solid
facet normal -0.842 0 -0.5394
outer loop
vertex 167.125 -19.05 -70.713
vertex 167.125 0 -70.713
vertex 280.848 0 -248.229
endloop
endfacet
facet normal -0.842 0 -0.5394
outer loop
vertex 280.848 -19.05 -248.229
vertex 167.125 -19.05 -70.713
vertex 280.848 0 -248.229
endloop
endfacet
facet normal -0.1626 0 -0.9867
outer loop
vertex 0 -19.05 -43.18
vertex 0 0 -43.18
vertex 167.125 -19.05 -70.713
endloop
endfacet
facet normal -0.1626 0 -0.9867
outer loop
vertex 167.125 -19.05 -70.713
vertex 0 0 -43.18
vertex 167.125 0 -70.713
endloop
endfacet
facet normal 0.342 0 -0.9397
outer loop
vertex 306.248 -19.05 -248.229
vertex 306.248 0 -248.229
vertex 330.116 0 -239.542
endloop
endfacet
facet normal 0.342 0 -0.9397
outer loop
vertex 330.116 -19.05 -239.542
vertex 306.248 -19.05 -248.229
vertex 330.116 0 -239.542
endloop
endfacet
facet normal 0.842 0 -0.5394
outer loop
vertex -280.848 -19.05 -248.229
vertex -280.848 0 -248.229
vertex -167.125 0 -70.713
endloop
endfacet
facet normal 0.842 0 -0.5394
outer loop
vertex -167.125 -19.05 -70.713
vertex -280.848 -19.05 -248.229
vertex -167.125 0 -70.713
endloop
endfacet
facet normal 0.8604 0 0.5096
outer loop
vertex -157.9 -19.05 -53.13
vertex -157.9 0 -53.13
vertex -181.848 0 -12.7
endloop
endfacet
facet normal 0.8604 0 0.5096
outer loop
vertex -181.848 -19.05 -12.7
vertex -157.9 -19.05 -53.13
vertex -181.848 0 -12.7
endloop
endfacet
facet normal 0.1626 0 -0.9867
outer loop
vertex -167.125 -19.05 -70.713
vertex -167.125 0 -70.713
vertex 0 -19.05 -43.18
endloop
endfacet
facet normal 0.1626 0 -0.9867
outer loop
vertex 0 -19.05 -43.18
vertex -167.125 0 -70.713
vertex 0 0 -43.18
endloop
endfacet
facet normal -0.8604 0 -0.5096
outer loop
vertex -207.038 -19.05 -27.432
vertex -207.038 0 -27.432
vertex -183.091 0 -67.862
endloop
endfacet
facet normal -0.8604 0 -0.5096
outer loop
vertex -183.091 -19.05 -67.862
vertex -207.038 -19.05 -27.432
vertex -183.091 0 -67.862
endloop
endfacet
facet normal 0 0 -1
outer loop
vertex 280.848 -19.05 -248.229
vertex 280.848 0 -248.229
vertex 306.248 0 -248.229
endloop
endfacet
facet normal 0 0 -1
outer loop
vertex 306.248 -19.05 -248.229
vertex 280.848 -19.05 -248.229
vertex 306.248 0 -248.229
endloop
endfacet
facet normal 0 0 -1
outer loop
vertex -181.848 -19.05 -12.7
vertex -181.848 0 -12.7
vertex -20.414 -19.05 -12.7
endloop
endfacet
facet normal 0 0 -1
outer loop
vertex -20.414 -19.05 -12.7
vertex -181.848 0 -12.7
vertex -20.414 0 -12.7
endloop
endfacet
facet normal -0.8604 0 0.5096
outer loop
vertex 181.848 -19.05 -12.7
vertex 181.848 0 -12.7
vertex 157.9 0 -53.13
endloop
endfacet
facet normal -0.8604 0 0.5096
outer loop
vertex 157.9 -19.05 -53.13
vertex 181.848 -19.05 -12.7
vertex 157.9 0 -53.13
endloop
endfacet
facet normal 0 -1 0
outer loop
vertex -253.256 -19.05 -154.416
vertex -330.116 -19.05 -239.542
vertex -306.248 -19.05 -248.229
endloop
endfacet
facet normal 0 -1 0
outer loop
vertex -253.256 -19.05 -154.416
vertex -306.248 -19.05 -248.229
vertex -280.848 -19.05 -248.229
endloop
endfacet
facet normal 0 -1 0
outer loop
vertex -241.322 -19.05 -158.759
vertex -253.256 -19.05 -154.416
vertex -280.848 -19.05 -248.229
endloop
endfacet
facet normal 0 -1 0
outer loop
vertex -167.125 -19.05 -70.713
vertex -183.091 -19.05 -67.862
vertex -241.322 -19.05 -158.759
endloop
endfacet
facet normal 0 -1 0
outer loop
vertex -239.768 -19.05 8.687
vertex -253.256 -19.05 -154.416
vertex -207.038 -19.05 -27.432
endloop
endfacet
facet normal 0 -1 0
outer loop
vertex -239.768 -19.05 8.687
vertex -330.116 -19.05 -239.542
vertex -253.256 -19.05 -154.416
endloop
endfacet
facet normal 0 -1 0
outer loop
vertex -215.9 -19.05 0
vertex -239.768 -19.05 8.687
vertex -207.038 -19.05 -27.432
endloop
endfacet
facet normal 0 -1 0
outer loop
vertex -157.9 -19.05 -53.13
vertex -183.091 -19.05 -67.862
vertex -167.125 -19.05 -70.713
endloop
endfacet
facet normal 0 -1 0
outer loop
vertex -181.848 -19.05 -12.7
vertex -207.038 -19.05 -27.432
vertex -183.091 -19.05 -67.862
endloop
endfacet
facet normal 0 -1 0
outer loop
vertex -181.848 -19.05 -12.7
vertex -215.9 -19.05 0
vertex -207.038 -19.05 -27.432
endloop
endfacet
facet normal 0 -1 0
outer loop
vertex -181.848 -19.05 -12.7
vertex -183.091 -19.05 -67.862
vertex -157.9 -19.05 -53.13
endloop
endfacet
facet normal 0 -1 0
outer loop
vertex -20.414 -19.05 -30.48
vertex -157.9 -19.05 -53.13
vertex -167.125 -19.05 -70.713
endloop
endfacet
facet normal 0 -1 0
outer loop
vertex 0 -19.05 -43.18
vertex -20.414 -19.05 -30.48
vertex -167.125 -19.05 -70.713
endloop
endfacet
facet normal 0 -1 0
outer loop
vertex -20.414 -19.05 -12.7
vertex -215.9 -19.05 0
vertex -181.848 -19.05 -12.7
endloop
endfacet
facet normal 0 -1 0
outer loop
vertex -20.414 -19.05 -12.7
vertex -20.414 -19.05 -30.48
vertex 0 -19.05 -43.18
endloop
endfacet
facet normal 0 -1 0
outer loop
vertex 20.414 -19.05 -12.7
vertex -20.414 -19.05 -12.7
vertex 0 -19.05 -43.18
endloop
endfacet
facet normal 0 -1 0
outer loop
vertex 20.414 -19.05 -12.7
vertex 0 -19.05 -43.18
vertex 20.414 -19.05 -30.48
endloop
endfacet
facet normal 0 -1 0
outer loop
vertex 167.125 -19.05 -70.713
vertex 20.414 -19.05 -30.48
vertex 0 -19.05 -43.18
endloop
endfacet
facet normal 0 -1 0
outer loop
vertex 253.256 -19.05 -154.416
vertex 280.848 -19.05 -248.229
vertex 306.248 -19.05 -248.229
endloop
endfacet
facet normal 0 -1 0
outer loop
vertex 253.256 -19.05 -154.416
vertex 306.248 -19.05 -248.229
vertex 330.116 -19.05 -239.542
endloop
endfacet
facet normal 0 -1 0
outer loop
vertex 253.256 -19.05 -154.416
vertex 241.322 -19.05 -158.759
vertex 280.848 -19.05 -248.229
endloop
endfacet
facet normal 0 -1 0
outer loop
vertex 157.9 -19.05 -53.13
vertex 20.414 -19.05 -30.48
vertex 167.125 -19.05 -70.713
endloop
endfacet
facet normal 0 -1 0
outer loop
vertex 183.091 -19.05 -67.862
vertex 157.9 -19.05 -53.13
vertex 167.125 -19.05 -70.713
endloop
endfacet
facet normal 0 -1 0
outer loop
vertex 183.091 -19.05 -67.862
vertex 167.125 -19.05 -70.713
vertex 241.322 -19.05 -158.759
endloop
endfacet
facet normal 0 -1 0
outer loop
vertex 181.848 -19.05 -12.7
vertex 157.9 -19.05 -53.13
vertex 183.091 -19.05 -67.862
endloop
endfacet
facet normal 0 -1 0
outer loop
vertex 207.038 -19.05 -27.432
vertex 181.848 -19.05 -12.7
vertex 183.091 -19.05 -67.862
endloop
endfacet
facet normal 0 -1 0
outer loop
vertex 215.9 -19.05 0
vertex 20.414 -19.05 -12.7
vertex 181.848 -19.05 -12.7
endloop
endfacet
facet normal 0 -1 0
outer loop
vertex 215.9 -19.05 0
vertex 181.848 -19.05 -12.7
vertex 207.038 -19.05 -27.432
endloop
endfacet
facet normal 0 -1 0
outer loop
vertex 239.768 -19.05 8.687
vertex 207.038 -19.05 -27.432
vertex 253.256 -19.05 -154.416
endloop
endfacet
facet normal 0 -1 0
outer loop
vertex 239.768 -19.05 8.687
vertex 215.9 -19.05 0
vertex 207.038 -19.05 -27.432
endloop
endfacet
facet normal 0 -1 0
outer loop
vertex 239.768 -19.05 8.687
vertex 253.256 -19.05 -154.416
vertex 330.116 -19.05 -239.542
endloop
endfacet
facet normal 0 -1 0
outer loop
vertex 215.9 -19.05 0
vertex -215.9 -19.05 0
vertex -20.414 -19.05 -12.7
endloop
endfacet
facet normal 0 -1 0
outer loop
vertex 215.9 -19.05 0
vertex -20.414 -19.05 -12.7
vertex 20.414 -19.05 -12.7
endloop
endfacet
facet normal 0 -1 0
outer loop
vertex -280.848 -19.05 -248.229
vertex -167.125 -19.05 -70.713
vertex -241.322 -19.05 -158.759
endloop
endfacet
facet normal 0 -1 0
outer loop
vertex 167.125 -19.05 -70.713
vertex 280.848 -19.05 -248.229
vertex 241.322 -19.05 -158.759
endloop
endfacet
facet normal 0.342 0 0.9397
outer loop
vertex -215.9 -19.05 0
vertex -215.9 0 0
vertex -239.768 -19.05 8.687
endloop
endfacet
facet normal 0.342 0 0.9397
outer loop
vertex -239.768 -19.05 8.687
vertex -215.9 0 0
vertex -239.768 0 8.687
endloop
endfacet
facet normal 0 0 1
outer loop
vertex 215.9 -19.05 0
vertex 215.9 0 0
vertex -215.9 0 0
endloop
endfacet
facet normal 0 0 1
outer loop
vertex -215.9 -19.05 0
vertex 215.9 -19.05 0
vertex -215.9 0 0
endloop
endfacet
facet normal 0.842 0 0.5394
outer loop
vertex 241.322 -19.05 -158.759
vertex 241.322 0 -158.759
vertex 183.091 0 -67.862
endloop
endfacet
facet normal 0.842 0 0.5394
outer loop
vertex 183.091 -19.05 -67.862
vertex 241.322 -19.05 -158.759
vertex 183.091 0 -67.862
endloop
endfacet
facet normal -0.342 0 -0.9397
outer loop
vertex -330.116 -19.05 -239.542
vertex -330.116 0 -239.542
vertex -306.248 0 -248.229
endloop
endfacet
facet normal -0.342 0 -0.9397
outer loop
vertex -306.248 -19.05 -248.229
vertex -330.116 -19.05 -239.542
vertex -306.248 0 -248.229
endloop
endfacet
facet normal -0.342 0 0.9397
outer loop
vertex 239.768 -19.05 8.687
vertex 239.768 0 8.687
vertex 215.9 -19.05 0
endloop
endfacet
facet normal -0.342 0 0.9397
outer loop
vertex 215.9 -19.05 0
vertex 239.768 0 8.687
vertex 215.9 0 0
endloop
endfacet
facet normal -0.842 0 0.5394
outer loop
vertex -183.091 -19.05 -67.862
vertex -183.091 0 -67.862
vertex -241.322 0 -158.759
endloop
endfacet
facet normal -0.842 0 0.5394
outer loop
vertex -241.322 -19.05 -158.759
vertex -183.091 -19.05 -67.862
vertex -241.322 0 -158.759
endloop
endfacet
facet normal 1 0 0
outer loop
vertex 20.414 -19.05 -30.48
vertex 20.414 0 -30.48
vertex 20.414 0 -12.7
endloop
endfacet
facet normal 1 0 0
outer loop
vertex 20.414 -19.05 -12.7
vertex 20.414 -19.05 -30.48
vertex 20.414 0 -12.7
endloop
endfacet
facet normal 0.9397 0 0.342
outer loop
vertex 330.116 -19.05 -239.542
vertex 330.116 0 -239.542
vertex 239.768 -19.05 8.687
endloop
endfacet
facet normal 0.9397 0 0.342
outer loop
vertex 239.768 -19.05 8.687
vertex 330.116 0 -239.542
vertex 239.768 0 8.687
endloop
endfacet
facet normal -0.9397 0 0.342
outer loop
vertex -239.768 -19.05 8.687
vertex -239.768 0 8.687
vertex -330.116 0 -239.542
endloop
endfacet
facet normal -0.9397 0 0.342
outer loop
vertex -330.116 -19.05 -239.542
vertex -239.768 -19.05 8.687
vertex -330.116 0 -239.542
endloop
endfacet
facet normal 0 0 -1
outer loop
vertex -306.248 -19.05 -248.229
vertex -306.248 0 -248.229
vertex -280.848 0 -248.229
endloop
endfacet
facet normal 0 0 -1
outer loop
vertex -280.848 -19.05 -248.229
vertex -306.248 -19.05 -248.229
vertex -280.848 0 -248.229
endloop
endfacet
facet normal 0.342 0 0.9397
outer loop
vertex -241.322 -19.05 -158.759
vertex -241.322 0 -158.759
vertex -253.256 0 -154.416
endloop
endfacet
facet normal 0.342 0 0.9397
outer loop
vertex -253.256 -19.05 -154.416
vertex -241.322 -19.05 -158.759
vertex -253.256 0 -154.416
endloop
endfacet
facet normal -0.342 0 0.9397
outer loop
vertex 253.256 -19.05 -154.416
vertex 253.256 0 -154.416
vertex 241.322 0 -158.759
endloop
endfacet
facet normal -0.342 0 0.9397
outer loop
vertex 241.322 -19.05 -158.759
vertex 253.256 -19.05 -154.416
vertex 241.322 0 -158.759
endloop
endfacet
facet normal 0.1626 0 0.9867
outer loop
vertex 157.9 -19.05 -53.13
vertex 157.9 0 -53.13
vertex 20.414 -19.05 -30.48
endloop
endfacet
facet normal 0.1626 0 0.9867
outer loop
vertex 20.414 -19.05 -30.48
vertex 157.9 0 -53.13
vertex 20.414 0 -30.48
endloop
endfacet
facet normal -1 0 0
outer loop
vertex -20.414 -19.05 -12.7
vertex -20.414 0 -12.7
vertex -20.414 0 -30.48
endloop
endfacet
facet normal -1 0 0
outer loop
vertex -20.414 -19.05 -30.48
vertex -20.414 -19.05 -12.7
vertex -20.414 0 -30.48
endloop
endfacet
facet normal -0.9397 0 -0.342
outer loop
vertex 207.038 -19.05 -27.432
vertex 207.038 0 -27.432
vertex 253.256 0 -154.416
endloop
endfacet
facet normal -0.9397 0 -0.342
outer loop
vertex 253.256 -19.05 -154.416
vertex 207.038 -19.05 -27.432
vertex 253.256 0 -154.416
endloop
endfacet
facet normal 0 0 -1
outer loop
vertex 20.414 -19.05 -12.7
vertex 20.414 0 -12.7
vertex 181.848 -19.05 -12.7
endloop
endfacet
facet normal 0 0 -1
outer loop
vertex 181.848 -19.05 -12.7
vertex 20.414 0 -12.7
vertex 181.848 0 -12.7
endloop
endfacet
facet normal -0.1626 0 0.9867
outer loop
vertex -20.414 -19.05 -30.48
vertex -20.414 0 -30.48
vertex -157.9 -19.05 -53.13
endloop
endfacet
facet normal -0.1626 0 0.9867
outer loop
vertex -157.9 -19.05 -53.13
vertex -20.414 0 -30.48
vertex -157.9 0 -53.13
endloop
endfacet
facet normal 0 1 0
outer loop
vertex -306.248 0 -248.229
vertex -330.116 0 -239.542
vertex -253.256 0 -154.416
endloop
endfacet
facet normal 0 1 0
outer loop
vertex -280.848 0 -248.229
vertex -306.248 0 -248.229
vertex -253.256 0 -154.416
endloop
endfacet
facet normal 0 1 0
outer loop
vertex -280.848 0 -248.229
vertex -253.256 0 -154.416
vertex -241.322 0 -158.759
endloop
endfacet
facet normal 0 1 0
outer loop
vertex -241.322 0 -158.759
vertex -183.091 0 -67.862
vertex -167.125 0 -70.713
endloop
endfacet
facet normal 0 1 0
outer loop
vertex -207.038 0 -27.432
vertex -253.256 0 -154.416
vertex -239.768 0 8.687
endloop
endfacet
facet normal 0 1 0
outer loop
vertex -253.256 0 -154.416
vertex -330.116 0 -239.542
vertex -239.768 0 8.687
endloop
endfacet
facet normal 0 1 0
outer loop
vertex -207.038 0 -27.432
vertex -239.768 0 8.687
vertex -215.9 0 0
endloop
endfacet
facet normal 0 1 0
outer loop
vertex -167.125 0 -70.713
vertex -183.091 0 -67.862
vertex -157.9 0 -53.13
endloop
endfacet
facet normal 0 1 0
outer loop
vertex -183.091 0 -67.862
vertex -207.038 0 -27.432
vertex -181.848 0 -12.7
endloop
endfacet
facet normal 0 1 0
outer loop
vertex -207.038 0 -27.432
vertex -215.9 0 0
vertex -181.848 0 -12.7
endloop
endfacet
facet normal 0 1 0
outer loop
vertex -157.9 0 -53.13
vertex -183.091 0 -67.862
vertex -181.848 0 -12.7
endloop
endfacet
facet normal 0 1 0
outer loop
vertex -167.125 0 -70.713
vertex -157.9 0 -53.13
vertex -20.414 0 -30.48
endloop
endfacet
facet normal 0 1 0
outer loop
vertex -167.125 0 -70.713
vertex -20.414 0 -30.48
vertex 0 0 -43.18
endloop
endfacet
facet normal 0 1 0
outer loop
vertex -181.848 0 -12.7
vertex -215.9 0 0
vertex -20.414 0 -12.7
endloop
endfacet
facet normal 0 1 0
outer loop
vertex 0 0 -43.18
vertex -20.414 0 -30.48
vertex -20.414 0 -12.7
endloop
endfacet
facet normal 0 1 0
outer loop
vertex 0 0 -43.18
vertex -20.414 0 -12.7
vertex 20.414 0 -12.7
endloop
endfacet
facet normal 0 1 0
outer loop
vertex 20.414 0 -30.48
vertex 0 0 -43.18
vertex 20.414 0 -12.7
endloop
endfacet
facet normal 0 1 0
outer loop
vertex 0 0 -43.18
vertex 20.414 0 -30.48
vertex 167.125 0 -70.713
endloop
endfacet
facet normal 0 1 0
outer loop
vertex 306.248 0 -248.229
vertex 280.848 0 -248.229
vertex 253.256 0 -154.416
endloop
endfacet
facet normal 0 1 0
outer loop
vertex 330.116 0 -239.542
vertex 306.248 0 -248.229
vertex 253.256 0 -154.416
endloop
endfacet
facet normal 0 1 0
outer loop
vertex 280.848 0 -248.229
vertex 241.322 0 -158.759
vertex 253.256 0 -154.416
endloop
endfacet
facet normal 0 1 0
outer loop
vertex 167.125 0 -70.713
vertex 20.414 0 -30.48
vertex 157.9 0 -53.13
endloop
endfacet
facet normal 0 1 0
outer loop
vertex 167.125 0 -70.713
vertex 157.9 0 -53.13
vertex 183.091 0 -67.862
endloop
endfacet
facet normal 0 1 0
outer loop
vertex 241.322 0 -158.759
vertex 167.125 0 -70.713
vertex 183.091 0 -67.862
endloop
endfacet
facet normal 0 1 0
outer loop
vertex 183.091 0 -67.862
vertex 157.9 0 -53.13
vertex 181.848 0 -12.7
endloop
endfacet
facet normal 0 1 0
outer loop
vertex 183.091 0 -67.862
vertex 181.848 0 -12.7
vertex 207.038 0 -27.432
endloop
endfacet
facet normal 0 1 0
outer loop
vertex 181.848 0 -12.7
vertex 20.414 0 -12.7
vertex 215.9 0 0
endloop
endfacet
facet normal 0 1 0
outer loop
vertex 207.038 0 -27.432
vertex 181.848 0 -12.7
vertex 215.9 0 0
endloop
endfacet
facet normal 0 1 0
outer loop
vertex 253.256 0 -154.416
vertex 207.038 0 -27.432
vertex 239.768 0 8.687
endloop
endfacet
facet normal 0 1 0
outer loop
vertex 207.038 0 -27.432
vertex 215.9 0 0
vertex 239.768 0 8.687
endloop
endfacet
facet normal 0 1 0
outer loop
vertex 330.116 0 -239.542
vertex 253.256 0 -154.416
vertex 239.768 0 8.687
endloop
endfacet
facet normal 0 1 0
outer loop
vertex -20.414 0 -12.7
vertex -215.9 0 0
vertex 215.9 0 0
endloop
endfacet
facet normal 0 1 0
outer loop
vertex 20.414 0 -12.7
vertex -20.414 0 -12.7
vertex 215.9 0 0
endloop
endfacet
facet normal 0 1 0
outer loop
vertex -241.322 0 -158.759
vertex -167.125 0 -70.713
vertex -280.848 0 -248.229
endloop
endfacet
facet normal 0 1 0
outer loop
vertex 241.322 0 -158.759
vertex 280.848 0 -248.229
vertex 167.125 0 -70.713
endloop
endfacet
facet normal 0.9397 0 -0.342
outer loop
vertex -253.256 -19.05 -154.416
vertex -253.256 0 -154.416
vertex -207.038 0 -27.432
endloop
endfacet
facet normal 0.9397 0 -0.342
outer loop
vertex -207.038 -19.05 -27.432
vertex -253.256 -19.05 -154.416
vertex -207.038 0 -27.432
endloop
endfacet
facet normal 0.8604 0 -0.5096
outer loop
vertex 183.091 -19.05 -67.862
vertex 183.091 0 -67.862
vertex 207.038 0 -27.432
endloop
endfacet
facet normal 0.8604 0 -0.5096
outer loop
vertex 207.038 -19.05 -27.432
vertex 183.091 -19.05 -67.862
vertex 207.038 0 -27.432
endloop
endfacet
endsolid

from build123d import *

# Parameters (mm, degrees)
F2_DEPTH = 19.05


# Not quite as in the source:
# - a variable given as a bare number and used for a length is read in inches; the dataset says mm whatever the document's units were


with BuildPart() as f2:
    # F1 (on Front) → F2 (new body)
    with BuildSketch(Plane.XZ):
        Polygon((215.9, 0), (0, 0), (-215.9, 0), (-306.2480410609, -248.2292027068), (-280.8480410609, -248.2292027068), (-167.1250061285, -70.7126014387), (0, -43.18), (167.1250061285, -70.7126014387), (280.8480410609, -248.2292027068), (306.2480410609, -248.2292027068), align=None)
        Polygon((-253.2563468183, -154.4156124752), (-207.0382383225, -27.4324030132), (-183.0905760207, -67.8622134293), (-241.3222505343, -158.7592682954), align=None, mode=Mode.SUBTRACT)
        Polygon((-181.84793878, -12.7), (-20.4141870137, -12.7), (-20.4141870137, -30.48), (-157.9002764782, -53.1298104161), align=None, mode=Mode.SUBTRACT)
        Polygon((183.0905760207, -67.8622134293), (207.0382383225, -27.4324030132), (253.2563468183, -154.4156124752), (241.3222505343, -158.7592682954), align=None, mode=Mode.SUBTRACT)
        Polygon((157.9002764782, -53.1298104161), (20.4141870137, -30.48), (20.4141870137, -12.7), (181.84793878, -12.7), align=None, mode=Mode.SUBTRACT)
        Polygon((-306.2480410609, -248.2292027068), (-215.9, 0), (-239.768192568, 8.6873116405), (-330.1162336289, -239.5418910663), align=None)
        Polygon((239.768192568, 8.6873116405), (215.9, 0), (306.2480410609, -248.2292027068), (330.1162336289, -239.5418910663), align=None)
    extrude(amount=F2_DEPTH)


solid = f2.part
